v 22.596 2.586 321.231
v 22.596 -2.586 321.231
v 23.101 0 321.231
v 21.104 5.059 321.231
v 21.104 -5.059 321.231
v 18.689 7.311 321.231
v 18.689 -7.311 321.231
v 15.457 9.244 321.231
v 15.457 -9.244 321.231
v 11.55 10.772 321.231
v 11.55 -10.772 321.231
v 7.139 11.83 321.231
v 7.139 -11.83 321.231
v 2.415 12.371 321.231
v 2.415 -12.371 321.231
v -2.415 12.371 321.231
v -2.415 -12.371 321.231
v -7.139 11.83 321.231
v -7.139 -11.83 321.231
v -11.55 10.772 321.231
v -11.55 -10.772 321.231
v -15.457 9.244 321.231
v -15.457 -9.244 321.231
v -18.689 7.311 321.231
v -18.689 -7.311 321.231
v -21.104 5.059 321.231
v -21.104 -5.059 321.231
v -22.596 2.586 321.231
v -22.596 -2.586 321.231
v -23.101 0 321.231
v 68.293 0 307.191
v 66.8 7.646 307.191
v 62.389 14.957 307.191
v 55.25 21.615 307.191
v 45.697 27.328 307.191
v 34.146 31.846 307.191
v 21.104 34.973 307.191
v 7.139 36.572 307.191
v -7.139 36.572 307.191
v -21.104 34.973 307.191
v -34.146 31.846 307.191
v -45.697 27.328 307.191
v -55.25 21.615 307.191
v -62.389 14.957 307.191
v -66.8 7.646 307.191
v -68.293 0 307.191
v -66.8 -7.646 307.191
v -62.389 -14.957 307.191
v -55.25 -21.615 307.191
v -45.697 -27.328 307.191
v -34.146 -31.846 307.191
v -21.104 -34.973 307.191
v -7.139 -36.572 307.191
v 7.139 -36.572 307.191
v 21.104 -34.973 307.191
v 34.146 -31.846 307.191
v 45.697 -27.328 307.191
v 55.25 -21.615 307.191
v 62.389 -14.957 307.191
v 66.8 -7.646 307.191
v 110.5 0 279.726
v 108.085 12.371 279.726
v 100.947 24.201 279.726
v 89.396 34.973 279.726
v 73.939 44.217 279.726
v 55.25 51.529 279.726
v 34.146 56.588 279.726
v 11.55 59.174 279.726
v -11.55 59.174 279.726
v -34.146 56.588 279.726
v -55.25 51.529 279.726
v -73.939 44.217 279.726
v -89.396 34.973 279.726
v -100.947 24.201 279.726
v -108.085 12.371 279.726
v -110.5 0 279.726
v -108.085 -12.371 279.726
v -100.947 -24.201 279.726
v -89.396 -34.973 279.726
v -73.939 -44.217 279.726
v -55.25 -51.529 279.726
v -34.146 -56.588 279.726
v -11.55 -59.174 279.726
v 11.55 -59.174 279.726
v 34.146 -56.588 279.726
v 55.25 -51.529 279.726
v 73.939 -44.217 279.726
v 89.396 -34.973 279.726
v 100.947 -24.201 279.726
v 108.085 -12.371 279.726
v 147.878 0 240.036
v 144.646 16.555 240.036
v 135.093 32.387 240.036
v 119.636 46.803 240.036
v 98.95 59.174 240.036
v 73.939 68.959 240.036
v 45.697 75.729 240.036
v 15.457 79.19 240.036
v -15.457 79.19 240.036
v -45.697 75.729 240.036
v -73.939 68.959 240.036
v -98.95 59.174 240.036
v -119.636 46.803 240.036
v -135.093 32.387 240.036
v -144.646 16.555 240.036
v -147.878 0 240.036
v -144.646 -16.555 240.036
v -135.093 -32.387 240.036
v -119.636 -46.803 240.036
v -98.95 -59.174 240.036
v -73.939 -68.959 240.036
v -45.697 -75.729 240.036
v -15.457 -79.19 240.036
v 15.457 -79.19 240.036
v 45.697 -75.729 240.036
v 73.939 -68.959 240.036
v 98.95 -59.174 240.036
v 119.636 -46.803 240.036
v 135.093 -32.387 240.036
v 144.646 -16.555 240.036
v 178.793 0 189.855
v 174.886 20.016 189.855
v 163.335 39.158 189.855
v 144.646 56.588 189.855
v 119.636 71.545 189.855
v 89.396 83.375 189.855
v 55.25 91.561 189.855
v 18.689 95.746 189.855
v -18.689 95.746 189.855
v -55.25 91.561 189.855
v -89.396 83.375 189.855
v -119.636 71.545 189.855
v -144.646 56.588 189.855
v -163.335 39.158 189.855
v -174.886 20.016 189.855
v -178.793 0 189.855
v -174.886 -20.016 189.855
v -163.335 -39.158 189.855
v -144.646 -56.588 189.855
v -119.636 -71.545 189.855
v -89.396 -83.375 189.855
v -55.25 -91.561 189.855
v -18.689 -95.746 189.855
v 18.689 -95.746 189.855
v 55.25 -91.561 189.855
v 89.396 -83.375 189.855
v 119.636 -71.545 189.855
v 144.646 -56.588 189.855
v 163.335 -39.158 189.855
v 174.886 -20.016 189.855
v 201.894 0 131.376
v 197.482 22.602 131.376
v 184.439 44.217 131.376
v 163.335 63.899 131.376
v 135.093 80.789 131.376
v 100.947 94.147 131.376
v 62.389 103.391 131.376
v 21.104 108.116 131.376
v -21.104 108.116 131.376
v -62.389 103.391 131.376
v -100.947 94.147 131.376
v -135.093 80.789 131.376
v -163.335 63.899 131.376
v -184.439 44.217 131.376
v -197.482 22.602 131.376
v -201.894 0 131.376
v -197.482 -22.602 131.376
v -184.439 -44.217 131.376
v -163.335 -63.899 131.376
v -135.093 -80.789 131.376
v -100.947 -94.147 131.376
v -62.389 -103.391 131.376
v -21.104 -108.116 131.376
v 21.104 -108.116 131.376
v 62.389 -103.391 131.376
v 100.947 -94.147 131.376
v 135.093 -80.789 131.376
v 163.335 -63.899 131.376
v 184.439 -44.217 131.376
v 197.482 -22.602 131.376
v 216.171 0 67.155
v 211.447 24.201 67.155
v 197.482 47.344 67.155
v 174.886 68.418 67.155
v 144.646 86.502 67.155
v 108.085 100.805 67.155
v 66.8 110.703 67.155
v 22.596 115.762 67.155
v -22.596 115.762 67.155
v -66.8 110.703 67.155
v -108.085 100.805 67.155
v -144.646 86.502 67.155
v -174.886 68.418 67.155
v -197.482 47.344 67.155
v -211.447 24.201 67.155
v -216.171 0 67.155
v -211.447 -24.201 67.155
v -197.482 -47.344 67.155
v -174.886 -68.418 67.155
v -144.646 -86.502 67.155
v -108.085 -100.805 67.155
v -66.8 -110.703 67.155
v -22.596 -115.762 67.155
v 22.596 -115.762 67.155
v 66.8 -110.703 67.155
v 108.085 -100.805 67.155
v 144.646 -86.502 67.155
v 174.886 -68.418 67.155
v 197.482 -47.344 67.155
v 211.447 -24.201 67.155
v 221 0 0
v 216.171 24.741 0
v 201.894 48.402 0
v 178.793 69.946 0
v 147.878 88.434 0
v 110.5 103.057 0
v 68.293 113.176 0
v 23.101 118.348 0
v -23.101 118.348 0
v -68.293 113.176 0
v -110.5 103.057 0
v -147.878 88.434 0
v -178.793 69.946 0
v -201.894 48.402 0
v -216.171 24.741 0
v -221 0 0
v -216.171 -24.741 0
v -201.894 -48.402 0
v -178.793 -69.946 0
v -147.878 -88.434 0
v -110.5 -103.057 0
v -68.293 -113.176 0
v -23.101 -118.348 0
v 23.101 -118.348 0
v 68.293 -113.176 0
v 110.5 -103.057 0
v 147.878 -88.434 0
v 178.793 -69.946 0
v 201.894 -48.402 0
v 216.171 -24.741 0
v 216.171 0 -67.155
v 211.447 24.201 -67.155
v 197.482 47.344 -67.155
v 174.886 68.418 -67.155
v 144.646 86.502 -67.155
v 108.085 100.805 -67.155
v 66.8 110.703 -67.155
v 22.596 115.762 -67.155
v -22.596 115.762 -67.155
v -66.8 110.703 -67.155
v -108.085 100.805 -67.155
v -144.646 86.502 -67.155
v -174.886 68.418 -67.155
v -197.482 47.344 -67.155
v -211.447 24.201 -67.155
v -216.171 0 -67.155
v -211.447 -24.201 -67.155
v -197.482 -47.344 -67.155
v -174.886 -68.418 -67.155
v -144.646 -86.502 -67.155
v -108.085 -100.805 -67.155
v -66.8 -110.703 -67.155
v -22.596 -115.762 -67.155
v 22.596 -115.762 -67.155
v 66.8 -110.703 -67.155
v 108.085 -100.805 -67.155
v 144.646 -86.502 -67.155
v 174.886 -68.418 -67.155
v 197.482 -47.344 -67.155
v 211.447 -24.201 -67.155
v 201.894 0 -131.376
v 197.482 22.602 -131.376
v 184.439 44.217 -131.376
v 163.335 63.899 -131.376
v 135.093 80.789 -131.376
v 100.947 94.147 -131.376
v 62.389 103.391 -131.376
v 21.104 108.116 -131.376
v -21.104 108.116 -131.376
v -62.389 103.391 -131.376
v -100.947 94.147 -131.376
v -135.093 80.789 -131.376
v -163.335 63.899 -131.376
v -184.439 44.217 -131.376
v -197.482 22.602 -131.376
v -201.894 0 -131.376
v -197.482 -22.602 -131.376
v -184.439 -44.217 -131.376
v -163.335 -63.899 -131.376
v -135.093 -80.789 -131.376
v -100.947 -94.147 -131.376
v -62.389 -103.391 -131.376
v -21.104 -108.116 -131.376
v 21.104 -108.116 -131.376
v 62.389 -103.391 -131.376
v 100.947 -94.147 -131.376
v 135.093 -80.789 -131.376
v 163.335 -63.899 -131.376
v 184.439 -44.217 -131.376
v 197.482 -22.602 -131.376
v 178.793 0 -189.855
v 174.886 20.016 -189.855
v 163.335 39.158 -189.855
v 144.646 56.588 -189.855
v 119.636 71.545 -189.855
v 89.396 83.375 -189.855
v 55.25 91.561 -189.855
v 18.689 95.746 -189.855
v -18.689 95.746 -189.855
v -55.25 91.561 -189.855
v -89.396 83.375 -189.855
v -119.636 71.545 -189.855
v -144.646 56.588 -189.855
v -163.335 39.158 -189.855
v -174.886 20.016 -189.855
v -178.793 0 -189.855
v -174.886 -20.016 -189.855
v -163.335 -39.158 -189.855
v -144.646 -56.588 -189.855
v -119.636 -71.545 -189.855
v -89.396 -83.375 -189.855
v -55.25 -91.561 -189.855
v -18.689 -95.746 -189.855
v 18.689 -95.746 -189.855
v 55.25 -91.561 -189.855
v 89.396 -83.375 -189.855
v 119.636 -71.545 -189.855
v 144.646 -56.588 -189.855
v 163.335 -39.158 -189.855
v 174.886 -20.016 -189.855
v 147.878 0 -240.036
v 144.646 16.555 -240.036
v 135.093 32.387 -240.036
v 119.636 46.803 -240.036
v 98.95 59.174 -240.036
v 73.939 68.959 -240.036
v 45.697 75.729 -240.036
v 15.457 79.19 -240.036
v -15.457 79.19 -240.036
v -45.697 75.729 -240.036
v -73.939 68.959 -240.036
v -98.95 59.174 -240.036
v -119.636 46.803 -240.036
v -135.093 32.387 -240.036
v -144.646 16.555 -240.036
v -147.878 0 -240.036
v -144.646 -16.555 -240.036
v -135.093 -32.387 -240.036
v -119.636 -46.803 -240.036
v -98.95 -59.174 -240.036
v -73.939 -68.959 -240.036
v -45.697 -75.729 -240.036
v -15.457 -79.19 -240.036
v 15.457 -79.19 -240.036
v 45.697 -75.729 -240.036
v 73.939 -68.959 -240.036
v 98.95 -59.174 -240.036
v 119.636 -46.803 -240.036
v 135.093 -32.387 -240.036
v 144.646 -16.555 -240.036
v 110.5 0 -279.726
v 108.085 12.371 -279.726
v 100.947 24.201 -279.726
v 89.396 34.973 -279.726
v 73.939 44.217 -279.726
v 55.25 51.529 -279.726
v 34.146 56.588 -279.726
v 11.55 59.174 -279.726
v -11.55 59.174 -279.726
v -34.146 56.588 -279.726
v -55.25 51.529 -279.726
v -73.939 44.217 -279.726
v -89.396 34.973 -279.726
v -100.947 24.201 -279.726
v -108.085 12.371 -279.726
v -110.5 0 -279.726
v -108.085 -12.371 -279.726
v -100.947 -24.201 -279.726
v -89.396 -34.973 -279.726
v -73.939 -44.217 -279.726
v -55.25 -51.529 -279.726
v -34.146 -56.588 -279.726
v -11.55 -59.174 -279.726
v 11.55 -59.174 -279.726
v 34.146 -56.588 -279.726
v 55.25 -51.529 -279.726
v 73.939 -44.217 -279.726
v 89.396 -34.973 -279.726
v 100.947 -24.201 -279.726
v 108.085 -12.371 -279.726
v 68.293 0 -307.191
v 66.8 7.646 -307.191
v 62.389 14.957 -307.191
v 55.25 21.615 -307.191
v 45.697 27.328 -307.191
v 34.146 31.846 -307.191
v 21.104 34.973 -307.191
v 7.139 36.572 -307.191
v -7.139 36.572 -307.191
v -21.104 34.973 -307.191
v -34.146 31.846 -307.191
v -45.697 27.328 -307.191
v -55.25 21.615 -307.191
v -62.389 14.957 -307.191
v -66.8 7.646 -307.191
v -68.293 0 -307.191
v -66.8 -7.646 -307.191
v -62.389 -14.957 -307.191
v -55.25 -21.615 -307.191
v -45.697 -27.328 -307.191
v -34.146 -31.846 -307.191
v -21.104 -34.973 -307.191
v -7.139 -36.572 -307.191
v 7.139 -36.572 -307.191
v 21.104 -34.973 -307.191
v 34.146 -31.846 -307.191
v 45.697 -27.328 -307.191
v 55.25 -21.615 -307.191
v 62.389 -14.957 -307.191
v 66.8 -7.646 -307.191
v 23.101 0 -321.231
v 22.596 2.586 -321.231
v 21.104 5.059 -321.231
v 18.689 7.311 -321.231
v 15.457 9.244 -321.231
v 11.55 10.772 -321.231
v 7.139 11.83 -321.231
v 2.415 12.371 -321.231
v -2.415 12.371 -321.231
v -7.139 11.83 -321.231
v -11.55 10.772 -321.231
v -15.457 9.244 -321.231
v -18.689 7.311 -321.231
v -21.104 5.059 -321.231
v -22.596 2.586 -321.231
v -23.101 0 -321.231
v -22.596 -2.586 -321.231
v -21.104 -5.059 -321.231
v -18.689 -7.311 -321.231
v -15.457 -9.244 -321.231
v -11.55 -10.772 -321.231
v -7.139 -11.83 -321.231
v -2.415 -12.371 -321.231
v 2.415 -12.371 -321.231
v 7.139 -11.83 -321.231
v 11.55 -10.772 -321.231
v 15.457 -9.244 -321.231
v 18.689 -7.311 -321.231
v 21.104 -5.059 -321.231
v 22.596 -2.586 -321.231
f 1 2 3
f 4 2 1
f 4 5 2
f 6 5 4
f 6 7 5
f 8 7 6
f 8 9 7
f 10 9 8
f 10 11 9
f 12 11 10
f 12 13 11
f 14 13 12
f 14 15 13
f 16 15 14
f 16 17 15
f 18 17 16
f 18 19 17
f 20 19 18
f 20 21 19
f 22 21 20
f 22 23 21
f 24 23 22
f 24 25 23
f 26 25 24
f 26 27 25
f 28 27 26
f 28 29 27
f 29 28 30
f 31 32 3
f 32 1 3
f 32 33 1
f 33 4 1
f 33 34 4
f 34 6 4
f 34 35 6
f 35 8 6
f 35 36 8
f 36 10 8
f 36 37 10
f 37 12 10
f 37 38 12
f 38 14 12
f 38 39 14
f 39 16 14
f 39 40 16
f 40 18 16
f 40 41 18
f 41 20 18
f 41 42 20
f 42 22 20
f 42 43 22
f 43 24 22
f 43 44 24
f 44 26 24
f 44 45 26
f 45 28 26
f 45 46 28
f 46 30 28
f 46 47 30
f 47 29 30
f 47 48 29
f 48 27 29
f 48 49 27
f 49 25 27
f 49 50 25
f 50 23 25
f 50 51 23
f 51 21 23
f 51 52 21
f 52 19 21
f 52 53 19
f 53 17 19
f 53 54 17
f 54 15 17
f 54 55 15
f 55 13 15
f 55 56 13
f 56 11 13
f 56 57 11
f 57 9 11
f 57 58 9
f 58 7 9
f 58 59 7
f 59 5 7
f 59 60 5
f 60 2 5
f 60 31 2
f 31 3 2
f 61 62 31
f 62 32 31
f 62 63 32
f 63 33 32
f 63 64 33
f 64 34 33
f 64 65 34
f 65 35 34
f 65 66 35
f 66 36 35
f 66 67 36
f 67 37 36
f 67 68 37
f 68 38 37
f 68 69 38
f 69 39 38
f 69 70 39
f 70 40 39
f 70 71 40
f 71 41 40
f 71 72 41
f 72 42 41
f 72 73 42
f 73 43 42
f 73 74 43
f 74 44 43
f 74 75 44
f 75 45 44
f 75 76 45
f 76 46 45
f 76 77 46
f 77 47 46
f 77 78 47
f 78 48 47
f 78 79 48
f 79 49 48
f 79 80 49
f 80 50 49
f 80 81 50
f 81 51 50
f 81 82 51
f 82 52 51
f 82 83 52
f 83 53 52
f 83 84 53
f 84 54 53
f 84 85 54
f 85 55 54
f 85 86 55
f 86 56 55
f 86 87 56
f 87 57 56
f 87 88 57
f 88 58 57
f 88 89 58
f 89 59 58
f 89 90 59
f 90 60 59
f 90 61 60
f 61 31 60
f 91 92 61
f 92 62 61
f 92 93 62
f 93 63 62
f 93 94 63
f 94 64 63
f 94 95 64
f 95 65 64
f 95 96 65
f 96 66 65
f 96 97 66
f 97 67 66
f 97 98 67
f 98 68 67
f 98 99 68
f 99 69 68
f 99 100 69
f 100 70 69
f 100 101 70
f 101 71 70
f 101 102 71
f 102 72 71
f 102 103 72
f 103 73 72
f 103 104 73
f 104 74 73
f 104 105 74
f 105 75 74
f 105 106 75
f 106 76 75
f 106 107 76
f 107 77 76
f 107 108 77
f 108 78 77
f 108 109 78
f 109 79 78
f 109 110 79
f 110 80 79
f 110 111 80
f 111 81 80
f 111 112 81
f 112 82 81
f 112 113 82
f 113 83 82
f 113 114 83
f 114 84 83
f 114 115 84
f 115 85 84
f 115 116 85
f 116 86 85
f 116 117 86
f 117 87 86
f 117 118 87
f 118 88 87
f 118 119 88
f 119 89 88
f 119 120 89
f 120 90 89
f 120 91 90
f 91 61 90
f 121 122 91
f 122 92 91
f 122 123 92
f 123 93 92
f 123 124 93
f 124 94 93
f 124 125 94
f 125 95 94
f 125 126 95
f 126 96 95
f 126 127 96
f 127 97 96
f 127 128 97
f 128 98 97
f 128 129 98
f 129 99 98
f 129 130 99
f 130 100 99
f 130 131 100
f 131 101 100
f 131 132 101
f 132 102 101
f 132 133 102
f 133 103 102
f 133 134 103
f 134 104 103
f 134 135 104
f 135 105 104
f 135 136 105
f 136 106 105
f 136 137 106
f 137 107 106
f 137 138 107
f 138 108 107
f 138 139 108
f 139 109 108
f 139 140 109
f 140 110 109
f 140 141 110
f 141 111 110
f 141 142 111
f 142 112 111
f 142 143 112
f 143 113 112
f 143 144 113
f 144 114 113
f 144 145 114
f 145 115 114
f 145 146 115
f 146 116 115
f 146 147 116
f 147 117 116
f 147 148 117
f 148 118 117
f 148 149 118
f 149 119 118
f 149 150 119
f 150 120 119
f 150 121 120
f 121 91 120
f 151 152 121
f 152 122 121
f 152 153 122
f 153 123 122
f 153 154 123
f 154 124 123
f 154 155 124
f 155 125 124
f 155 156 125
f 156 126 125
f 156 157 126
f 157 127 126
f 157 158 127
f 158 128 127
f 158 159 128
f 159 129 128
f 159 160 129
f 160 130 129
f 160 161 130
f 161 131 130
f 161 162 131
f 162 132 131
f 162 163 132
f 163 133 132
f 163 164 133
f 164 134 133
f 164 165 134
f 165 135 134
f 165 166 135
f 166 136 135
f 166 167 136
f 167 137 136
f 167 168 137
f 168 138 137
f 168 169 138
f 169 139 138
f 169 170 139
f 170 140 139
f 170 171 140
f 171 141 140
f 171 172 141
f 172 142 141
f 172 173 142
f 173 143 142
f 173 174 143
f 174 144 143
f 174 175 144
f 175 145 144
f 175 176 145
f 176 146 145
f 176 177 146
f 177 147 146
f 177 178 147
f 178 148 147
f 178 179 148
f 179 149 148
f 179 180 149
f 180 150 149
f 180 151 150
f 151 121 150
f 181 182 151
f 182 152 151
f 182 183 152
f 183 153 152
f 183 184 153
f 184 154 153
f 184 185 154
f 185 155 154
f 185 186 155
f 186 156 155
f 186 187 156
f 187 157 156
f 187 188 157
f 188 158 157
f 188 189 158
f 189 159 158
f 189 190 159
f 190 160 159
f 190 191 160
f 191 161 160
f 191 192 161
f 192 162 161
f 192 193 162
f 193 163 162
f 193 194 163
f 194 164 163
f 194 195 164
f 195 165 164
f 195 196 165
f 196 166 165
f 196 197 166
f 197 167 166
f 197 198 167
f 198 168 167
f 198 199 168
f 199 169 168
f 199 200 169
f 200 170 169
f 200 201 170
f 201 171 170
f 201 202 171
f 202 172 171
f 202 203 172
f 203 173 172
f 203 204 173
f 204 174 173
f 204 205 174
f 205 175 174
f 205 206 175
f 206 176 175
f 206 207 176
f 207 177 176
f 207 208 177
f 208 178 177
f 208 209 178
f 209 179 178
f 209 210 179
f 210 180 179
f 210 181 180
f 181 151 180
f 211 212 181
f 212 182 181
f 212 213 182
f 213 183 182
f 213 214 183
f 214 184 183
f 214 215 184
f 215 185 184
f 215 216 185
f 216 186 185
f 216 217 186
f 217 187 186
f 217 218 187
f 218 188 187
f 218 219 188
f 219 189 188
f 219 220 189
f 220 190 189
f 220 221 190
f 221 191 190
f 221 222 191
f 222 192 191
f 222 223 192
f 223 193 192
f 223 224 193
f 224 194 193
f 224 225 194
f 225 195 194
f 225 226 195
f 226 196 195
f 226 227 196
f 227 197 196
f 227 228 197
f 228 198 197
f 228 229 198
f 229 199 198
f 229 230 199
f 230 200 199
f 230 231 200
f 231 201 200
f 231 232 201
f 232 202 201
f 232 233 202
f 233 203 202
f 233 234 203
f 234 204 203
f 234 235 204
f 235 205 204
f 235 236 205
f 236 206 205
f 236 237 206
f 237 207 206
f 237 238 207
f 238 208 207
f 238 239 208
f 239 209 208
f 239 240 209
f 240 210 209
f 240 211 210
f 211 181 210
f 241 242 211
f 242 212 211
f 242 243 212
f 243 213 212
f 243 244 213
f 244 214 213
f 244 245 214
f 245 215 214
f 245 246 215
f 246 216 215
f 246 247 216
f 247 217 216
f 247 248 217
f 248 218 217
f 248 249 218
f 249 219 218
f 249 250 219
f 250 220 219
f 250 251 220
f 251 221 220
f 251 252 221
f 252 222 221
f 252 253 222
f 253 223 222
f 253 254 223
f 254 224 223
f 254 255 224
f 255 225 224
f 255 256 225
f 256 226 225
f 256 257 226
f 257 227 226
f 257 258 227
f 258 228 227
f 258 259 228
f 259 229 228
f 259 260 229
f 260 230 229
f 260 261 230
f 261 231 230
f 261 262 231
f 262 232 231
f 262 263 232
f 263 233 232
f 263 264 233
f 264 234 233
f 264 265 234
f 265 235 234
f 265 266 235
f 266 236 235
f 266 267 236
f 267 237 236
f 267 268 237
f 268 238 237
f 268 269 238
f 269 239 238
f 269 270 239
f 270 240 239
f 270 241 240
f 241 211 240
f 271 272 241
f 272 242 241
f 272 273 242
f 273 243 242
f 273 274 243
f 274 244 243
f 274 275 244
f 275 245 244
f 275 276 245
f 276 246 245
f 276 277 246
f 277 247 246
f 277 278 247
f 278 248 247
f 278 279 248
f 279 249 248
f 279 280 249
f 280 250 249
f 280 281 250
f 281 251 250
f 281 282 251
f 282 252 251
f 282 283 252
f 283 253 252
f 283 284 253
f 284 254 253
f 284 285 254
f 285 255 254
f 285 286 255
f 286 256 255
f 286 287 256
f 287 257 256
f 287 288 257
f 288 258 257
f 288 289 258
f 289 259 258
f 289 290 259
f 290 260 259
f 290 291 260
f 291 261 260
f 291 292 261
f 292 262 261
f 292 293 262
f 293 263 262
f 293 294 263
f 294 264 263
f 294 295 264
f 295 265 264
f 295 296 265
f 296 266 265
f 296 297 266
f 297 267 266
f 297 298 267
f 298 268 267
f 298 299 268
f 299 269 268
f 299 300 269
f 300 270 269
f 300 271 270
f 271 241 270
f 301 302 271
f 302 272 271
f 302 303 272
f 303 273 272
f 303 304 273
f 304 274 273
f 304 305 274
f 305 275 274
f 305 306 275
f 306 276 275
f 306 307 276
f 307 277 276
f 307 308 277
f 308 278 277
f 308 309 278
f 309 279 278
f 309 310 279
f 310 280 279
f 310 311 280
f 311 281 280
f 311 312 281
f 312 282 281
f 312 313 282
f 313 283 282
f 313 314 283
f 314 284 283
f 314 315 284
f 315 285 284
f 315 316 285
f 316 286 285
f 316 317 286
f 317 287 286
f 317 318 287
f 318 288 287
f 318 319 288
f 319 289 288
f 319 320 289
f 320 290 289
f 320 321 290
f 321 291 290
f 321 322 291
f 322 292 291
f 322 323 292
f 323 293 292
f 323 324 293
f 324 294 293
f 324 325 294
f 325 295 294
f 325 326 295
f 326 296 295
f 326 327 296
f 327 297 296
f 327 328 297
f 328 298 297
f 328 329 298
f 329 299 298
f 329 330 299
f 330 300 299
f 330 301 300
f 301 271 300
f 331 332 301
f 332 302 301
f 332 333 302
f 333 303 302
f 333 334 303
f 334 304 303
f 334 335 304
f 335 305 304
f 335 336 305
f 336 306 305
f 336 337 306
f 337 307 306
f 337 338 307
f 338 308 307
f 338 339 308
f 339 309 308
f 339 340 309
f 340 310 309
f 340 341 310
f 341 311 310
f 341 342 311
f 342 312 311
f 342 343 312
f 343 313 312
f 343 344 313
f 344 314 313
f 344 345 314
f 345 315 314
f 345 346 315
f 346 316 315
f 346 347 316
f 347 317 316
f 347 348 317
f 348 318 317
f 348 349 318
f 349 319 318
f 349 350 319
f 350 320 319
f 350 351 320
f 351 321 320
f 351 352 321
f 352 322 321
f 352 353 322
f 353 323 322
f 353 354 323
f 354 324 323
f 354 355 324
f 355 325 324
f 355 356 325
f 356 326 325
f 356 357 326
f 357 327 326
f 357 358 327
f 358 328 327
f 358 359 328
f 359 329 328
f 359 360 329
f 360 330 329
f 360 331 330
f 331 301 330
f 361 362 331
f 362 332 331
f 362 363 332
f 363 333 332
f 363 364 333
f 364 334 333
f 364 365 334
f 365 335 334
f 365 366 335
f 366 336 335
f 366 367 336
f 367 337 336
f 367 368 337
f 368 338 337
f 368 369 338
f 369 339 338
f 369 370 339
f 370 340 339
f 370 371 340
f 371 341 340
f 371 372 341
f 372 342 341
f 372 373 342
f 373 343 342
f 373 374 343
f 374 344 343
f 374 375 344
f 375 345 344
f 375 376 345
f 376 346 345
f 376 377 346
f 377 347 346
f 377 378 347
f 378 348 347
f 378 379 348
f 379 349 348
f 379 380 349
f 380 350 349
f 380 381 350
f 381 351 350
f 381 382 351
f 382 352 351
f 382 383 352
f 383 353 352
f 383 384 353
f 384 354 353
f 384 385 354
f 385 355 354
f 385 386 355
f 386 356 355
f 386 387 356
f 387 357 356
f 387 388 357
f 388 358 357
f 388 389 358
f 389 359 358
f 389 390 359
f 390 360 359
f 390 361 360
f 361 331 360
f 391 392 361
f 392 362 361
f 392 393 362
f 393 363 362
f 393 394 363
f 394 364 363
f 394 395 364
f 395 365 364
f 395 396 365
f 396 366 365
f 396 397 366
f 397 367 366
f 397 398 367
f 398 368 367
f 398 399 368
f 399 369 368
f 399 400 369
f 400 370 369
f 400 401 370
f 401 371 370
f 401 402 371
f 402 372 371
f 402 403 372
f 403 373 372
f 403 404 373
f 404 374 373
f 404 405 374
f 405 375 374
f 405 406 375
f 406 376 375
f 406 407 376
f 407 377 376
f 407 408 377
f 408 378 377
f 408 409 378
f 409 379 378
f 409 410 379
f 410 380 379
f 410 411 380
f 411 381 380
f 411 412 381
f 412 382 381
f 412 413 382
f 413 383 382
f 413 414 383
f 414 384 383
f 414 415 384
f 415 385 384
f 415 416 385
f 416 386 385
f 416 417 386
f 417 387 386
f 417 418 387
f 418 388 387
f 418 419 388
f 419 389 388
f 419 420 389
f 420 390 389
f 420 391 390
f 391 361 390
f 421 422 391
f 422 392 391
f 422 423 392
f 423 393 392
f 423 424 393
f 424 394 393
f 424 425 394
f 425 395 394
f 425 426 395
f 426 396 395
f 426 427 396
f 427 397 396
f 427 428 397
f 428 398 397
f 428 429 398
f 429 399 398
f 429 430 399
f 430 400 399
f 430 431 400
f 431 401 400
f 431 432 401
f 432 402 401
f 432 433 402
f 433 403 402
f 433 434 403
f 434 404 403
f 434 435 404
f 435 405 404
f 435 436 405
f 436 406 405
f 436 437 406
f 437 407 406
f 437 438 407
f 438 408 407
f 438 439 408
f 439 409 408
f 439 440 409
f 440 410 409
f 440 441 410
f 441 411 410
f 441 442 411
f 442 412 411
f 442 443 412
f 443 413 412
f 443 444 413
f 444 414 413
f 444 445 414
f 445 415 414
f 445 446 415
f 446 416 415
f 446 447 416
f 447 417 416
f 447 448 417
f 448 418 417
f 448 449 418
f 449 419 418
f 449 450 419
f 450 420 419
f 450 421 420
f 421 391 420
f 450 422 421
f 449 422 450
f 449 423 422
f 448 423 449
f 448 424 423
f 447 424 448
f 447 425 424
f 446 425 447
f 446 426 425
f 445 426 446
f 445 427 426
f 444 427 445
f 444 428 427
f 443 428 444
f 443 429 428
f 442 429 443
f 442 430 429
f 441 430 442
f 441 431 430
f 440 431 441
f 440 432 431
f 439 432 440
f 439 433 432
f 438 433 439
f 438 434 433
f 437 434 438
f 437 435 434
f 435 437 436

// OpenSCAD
// Generated by SolidPython 1.0.1 on 2020-07-29 00:46:50


scale(v = [13, 7, 19]) {
	sphere(r = 17);
}
/***********************************************
*********      SolidPython code:      **********
************************************************
 
# import packages: SolidPython
from solid import *
from solid.utils import *
from itertools import chain, combinations, permutations


class Resize:

    def __init__(self, scad_file):
        self.scad_file = scad_file
        #self.scad_file = import_scad(scad_file)
        # cone/cylinder param:
        self.r1 = 0
        self.r2 = 0
        self.h = 0
        # rectangular prism param:
        self.w = 0
        self.l = 0
        # ellipse param:
        self.r = 0

    # import OpenScad code (file name corresponds to shape)


    # classify shape + parameters
    def assign(self, param1, param2, param3):
        if self.scad_file == 'cone.scad':
            self.r1 = param1
            self.r2 = param2
            self.h = param3
        elif self.scad_file == 'cylinder.scad':
            self.r1 = param1
            self.r2 = param2
            self.h = param3
        elif self.scad_file == 'rectangularPrism.scad':
            self.h = param1
            self.l = param2
            self.w = param3
        else:
            self.r = param1
            self.h = param2

    # resize parameters
    def iterate(self):
        x = range(3, 20, 2)
        i = 1
        if self.scad_file == 'cone.scad':
            tempList = list(permutations(x, 2))
            for temp in tempList:
                param1 = temp[0]
                param2 = temp[1]
                filepath = 'produced_scad_files/' + 'cone' + str(param1) + '_' + str(param2) + '_' + '.scad'
                scad_render_to_file(cylinder(h=param1, r1=param2, r2=0), filepath)

        elif self.scad_file == 'cylinder.scad':
            tempList = list(permutations(x, 3))
            for temp in tempList:
                param1 = temp[0]
                param2 = temp[1]
                filepath = 'produced_scad_files/' + 'cylinder' + str(param1) + '_' + str(param2) + '_' + '.scad'
                scad_render_to_file(cylinder(h=param1, r1=param2, r2=param2), filepath)

        elif self.scad_file == 'rectangularPrism.scad':
            tempList = list(permutations(x, 3))
            for temp in tempList:
                param1 = temp[0]
                param2 = temp[1]
                param3 = temp[2]
                filepath = 'produced_scad_files/' + 'rectangularPrism' + str(param1) + '_' + str(param2) + '_' + str(
                    param3) + '.scad'
                scad_render_to_file(cube(size=(param1, param2, param3)), filepath)

        elif self.scad_file == 'ellipse.scad':
            tempList = list(permutations(x, 4))
            for temp in tempList:
                param1 = temp[0]
                param2 = temp[1]
                param3 = temp[2]
                param4 = temp[3]
                filepath = 'produced_scad_files/' + 'ellipse' + str(param1) + '_' + str(param2) + '_' + str(param3) + '_' + str(param4) + '.scad'
                scad_render_to_file(scale([param1, param2, param3])(sphere(r=param4)), filepath)

    def render_to_scadfile(self):
        scad_render_to_file(scad, 'example.scad') 
 
************************************************/
